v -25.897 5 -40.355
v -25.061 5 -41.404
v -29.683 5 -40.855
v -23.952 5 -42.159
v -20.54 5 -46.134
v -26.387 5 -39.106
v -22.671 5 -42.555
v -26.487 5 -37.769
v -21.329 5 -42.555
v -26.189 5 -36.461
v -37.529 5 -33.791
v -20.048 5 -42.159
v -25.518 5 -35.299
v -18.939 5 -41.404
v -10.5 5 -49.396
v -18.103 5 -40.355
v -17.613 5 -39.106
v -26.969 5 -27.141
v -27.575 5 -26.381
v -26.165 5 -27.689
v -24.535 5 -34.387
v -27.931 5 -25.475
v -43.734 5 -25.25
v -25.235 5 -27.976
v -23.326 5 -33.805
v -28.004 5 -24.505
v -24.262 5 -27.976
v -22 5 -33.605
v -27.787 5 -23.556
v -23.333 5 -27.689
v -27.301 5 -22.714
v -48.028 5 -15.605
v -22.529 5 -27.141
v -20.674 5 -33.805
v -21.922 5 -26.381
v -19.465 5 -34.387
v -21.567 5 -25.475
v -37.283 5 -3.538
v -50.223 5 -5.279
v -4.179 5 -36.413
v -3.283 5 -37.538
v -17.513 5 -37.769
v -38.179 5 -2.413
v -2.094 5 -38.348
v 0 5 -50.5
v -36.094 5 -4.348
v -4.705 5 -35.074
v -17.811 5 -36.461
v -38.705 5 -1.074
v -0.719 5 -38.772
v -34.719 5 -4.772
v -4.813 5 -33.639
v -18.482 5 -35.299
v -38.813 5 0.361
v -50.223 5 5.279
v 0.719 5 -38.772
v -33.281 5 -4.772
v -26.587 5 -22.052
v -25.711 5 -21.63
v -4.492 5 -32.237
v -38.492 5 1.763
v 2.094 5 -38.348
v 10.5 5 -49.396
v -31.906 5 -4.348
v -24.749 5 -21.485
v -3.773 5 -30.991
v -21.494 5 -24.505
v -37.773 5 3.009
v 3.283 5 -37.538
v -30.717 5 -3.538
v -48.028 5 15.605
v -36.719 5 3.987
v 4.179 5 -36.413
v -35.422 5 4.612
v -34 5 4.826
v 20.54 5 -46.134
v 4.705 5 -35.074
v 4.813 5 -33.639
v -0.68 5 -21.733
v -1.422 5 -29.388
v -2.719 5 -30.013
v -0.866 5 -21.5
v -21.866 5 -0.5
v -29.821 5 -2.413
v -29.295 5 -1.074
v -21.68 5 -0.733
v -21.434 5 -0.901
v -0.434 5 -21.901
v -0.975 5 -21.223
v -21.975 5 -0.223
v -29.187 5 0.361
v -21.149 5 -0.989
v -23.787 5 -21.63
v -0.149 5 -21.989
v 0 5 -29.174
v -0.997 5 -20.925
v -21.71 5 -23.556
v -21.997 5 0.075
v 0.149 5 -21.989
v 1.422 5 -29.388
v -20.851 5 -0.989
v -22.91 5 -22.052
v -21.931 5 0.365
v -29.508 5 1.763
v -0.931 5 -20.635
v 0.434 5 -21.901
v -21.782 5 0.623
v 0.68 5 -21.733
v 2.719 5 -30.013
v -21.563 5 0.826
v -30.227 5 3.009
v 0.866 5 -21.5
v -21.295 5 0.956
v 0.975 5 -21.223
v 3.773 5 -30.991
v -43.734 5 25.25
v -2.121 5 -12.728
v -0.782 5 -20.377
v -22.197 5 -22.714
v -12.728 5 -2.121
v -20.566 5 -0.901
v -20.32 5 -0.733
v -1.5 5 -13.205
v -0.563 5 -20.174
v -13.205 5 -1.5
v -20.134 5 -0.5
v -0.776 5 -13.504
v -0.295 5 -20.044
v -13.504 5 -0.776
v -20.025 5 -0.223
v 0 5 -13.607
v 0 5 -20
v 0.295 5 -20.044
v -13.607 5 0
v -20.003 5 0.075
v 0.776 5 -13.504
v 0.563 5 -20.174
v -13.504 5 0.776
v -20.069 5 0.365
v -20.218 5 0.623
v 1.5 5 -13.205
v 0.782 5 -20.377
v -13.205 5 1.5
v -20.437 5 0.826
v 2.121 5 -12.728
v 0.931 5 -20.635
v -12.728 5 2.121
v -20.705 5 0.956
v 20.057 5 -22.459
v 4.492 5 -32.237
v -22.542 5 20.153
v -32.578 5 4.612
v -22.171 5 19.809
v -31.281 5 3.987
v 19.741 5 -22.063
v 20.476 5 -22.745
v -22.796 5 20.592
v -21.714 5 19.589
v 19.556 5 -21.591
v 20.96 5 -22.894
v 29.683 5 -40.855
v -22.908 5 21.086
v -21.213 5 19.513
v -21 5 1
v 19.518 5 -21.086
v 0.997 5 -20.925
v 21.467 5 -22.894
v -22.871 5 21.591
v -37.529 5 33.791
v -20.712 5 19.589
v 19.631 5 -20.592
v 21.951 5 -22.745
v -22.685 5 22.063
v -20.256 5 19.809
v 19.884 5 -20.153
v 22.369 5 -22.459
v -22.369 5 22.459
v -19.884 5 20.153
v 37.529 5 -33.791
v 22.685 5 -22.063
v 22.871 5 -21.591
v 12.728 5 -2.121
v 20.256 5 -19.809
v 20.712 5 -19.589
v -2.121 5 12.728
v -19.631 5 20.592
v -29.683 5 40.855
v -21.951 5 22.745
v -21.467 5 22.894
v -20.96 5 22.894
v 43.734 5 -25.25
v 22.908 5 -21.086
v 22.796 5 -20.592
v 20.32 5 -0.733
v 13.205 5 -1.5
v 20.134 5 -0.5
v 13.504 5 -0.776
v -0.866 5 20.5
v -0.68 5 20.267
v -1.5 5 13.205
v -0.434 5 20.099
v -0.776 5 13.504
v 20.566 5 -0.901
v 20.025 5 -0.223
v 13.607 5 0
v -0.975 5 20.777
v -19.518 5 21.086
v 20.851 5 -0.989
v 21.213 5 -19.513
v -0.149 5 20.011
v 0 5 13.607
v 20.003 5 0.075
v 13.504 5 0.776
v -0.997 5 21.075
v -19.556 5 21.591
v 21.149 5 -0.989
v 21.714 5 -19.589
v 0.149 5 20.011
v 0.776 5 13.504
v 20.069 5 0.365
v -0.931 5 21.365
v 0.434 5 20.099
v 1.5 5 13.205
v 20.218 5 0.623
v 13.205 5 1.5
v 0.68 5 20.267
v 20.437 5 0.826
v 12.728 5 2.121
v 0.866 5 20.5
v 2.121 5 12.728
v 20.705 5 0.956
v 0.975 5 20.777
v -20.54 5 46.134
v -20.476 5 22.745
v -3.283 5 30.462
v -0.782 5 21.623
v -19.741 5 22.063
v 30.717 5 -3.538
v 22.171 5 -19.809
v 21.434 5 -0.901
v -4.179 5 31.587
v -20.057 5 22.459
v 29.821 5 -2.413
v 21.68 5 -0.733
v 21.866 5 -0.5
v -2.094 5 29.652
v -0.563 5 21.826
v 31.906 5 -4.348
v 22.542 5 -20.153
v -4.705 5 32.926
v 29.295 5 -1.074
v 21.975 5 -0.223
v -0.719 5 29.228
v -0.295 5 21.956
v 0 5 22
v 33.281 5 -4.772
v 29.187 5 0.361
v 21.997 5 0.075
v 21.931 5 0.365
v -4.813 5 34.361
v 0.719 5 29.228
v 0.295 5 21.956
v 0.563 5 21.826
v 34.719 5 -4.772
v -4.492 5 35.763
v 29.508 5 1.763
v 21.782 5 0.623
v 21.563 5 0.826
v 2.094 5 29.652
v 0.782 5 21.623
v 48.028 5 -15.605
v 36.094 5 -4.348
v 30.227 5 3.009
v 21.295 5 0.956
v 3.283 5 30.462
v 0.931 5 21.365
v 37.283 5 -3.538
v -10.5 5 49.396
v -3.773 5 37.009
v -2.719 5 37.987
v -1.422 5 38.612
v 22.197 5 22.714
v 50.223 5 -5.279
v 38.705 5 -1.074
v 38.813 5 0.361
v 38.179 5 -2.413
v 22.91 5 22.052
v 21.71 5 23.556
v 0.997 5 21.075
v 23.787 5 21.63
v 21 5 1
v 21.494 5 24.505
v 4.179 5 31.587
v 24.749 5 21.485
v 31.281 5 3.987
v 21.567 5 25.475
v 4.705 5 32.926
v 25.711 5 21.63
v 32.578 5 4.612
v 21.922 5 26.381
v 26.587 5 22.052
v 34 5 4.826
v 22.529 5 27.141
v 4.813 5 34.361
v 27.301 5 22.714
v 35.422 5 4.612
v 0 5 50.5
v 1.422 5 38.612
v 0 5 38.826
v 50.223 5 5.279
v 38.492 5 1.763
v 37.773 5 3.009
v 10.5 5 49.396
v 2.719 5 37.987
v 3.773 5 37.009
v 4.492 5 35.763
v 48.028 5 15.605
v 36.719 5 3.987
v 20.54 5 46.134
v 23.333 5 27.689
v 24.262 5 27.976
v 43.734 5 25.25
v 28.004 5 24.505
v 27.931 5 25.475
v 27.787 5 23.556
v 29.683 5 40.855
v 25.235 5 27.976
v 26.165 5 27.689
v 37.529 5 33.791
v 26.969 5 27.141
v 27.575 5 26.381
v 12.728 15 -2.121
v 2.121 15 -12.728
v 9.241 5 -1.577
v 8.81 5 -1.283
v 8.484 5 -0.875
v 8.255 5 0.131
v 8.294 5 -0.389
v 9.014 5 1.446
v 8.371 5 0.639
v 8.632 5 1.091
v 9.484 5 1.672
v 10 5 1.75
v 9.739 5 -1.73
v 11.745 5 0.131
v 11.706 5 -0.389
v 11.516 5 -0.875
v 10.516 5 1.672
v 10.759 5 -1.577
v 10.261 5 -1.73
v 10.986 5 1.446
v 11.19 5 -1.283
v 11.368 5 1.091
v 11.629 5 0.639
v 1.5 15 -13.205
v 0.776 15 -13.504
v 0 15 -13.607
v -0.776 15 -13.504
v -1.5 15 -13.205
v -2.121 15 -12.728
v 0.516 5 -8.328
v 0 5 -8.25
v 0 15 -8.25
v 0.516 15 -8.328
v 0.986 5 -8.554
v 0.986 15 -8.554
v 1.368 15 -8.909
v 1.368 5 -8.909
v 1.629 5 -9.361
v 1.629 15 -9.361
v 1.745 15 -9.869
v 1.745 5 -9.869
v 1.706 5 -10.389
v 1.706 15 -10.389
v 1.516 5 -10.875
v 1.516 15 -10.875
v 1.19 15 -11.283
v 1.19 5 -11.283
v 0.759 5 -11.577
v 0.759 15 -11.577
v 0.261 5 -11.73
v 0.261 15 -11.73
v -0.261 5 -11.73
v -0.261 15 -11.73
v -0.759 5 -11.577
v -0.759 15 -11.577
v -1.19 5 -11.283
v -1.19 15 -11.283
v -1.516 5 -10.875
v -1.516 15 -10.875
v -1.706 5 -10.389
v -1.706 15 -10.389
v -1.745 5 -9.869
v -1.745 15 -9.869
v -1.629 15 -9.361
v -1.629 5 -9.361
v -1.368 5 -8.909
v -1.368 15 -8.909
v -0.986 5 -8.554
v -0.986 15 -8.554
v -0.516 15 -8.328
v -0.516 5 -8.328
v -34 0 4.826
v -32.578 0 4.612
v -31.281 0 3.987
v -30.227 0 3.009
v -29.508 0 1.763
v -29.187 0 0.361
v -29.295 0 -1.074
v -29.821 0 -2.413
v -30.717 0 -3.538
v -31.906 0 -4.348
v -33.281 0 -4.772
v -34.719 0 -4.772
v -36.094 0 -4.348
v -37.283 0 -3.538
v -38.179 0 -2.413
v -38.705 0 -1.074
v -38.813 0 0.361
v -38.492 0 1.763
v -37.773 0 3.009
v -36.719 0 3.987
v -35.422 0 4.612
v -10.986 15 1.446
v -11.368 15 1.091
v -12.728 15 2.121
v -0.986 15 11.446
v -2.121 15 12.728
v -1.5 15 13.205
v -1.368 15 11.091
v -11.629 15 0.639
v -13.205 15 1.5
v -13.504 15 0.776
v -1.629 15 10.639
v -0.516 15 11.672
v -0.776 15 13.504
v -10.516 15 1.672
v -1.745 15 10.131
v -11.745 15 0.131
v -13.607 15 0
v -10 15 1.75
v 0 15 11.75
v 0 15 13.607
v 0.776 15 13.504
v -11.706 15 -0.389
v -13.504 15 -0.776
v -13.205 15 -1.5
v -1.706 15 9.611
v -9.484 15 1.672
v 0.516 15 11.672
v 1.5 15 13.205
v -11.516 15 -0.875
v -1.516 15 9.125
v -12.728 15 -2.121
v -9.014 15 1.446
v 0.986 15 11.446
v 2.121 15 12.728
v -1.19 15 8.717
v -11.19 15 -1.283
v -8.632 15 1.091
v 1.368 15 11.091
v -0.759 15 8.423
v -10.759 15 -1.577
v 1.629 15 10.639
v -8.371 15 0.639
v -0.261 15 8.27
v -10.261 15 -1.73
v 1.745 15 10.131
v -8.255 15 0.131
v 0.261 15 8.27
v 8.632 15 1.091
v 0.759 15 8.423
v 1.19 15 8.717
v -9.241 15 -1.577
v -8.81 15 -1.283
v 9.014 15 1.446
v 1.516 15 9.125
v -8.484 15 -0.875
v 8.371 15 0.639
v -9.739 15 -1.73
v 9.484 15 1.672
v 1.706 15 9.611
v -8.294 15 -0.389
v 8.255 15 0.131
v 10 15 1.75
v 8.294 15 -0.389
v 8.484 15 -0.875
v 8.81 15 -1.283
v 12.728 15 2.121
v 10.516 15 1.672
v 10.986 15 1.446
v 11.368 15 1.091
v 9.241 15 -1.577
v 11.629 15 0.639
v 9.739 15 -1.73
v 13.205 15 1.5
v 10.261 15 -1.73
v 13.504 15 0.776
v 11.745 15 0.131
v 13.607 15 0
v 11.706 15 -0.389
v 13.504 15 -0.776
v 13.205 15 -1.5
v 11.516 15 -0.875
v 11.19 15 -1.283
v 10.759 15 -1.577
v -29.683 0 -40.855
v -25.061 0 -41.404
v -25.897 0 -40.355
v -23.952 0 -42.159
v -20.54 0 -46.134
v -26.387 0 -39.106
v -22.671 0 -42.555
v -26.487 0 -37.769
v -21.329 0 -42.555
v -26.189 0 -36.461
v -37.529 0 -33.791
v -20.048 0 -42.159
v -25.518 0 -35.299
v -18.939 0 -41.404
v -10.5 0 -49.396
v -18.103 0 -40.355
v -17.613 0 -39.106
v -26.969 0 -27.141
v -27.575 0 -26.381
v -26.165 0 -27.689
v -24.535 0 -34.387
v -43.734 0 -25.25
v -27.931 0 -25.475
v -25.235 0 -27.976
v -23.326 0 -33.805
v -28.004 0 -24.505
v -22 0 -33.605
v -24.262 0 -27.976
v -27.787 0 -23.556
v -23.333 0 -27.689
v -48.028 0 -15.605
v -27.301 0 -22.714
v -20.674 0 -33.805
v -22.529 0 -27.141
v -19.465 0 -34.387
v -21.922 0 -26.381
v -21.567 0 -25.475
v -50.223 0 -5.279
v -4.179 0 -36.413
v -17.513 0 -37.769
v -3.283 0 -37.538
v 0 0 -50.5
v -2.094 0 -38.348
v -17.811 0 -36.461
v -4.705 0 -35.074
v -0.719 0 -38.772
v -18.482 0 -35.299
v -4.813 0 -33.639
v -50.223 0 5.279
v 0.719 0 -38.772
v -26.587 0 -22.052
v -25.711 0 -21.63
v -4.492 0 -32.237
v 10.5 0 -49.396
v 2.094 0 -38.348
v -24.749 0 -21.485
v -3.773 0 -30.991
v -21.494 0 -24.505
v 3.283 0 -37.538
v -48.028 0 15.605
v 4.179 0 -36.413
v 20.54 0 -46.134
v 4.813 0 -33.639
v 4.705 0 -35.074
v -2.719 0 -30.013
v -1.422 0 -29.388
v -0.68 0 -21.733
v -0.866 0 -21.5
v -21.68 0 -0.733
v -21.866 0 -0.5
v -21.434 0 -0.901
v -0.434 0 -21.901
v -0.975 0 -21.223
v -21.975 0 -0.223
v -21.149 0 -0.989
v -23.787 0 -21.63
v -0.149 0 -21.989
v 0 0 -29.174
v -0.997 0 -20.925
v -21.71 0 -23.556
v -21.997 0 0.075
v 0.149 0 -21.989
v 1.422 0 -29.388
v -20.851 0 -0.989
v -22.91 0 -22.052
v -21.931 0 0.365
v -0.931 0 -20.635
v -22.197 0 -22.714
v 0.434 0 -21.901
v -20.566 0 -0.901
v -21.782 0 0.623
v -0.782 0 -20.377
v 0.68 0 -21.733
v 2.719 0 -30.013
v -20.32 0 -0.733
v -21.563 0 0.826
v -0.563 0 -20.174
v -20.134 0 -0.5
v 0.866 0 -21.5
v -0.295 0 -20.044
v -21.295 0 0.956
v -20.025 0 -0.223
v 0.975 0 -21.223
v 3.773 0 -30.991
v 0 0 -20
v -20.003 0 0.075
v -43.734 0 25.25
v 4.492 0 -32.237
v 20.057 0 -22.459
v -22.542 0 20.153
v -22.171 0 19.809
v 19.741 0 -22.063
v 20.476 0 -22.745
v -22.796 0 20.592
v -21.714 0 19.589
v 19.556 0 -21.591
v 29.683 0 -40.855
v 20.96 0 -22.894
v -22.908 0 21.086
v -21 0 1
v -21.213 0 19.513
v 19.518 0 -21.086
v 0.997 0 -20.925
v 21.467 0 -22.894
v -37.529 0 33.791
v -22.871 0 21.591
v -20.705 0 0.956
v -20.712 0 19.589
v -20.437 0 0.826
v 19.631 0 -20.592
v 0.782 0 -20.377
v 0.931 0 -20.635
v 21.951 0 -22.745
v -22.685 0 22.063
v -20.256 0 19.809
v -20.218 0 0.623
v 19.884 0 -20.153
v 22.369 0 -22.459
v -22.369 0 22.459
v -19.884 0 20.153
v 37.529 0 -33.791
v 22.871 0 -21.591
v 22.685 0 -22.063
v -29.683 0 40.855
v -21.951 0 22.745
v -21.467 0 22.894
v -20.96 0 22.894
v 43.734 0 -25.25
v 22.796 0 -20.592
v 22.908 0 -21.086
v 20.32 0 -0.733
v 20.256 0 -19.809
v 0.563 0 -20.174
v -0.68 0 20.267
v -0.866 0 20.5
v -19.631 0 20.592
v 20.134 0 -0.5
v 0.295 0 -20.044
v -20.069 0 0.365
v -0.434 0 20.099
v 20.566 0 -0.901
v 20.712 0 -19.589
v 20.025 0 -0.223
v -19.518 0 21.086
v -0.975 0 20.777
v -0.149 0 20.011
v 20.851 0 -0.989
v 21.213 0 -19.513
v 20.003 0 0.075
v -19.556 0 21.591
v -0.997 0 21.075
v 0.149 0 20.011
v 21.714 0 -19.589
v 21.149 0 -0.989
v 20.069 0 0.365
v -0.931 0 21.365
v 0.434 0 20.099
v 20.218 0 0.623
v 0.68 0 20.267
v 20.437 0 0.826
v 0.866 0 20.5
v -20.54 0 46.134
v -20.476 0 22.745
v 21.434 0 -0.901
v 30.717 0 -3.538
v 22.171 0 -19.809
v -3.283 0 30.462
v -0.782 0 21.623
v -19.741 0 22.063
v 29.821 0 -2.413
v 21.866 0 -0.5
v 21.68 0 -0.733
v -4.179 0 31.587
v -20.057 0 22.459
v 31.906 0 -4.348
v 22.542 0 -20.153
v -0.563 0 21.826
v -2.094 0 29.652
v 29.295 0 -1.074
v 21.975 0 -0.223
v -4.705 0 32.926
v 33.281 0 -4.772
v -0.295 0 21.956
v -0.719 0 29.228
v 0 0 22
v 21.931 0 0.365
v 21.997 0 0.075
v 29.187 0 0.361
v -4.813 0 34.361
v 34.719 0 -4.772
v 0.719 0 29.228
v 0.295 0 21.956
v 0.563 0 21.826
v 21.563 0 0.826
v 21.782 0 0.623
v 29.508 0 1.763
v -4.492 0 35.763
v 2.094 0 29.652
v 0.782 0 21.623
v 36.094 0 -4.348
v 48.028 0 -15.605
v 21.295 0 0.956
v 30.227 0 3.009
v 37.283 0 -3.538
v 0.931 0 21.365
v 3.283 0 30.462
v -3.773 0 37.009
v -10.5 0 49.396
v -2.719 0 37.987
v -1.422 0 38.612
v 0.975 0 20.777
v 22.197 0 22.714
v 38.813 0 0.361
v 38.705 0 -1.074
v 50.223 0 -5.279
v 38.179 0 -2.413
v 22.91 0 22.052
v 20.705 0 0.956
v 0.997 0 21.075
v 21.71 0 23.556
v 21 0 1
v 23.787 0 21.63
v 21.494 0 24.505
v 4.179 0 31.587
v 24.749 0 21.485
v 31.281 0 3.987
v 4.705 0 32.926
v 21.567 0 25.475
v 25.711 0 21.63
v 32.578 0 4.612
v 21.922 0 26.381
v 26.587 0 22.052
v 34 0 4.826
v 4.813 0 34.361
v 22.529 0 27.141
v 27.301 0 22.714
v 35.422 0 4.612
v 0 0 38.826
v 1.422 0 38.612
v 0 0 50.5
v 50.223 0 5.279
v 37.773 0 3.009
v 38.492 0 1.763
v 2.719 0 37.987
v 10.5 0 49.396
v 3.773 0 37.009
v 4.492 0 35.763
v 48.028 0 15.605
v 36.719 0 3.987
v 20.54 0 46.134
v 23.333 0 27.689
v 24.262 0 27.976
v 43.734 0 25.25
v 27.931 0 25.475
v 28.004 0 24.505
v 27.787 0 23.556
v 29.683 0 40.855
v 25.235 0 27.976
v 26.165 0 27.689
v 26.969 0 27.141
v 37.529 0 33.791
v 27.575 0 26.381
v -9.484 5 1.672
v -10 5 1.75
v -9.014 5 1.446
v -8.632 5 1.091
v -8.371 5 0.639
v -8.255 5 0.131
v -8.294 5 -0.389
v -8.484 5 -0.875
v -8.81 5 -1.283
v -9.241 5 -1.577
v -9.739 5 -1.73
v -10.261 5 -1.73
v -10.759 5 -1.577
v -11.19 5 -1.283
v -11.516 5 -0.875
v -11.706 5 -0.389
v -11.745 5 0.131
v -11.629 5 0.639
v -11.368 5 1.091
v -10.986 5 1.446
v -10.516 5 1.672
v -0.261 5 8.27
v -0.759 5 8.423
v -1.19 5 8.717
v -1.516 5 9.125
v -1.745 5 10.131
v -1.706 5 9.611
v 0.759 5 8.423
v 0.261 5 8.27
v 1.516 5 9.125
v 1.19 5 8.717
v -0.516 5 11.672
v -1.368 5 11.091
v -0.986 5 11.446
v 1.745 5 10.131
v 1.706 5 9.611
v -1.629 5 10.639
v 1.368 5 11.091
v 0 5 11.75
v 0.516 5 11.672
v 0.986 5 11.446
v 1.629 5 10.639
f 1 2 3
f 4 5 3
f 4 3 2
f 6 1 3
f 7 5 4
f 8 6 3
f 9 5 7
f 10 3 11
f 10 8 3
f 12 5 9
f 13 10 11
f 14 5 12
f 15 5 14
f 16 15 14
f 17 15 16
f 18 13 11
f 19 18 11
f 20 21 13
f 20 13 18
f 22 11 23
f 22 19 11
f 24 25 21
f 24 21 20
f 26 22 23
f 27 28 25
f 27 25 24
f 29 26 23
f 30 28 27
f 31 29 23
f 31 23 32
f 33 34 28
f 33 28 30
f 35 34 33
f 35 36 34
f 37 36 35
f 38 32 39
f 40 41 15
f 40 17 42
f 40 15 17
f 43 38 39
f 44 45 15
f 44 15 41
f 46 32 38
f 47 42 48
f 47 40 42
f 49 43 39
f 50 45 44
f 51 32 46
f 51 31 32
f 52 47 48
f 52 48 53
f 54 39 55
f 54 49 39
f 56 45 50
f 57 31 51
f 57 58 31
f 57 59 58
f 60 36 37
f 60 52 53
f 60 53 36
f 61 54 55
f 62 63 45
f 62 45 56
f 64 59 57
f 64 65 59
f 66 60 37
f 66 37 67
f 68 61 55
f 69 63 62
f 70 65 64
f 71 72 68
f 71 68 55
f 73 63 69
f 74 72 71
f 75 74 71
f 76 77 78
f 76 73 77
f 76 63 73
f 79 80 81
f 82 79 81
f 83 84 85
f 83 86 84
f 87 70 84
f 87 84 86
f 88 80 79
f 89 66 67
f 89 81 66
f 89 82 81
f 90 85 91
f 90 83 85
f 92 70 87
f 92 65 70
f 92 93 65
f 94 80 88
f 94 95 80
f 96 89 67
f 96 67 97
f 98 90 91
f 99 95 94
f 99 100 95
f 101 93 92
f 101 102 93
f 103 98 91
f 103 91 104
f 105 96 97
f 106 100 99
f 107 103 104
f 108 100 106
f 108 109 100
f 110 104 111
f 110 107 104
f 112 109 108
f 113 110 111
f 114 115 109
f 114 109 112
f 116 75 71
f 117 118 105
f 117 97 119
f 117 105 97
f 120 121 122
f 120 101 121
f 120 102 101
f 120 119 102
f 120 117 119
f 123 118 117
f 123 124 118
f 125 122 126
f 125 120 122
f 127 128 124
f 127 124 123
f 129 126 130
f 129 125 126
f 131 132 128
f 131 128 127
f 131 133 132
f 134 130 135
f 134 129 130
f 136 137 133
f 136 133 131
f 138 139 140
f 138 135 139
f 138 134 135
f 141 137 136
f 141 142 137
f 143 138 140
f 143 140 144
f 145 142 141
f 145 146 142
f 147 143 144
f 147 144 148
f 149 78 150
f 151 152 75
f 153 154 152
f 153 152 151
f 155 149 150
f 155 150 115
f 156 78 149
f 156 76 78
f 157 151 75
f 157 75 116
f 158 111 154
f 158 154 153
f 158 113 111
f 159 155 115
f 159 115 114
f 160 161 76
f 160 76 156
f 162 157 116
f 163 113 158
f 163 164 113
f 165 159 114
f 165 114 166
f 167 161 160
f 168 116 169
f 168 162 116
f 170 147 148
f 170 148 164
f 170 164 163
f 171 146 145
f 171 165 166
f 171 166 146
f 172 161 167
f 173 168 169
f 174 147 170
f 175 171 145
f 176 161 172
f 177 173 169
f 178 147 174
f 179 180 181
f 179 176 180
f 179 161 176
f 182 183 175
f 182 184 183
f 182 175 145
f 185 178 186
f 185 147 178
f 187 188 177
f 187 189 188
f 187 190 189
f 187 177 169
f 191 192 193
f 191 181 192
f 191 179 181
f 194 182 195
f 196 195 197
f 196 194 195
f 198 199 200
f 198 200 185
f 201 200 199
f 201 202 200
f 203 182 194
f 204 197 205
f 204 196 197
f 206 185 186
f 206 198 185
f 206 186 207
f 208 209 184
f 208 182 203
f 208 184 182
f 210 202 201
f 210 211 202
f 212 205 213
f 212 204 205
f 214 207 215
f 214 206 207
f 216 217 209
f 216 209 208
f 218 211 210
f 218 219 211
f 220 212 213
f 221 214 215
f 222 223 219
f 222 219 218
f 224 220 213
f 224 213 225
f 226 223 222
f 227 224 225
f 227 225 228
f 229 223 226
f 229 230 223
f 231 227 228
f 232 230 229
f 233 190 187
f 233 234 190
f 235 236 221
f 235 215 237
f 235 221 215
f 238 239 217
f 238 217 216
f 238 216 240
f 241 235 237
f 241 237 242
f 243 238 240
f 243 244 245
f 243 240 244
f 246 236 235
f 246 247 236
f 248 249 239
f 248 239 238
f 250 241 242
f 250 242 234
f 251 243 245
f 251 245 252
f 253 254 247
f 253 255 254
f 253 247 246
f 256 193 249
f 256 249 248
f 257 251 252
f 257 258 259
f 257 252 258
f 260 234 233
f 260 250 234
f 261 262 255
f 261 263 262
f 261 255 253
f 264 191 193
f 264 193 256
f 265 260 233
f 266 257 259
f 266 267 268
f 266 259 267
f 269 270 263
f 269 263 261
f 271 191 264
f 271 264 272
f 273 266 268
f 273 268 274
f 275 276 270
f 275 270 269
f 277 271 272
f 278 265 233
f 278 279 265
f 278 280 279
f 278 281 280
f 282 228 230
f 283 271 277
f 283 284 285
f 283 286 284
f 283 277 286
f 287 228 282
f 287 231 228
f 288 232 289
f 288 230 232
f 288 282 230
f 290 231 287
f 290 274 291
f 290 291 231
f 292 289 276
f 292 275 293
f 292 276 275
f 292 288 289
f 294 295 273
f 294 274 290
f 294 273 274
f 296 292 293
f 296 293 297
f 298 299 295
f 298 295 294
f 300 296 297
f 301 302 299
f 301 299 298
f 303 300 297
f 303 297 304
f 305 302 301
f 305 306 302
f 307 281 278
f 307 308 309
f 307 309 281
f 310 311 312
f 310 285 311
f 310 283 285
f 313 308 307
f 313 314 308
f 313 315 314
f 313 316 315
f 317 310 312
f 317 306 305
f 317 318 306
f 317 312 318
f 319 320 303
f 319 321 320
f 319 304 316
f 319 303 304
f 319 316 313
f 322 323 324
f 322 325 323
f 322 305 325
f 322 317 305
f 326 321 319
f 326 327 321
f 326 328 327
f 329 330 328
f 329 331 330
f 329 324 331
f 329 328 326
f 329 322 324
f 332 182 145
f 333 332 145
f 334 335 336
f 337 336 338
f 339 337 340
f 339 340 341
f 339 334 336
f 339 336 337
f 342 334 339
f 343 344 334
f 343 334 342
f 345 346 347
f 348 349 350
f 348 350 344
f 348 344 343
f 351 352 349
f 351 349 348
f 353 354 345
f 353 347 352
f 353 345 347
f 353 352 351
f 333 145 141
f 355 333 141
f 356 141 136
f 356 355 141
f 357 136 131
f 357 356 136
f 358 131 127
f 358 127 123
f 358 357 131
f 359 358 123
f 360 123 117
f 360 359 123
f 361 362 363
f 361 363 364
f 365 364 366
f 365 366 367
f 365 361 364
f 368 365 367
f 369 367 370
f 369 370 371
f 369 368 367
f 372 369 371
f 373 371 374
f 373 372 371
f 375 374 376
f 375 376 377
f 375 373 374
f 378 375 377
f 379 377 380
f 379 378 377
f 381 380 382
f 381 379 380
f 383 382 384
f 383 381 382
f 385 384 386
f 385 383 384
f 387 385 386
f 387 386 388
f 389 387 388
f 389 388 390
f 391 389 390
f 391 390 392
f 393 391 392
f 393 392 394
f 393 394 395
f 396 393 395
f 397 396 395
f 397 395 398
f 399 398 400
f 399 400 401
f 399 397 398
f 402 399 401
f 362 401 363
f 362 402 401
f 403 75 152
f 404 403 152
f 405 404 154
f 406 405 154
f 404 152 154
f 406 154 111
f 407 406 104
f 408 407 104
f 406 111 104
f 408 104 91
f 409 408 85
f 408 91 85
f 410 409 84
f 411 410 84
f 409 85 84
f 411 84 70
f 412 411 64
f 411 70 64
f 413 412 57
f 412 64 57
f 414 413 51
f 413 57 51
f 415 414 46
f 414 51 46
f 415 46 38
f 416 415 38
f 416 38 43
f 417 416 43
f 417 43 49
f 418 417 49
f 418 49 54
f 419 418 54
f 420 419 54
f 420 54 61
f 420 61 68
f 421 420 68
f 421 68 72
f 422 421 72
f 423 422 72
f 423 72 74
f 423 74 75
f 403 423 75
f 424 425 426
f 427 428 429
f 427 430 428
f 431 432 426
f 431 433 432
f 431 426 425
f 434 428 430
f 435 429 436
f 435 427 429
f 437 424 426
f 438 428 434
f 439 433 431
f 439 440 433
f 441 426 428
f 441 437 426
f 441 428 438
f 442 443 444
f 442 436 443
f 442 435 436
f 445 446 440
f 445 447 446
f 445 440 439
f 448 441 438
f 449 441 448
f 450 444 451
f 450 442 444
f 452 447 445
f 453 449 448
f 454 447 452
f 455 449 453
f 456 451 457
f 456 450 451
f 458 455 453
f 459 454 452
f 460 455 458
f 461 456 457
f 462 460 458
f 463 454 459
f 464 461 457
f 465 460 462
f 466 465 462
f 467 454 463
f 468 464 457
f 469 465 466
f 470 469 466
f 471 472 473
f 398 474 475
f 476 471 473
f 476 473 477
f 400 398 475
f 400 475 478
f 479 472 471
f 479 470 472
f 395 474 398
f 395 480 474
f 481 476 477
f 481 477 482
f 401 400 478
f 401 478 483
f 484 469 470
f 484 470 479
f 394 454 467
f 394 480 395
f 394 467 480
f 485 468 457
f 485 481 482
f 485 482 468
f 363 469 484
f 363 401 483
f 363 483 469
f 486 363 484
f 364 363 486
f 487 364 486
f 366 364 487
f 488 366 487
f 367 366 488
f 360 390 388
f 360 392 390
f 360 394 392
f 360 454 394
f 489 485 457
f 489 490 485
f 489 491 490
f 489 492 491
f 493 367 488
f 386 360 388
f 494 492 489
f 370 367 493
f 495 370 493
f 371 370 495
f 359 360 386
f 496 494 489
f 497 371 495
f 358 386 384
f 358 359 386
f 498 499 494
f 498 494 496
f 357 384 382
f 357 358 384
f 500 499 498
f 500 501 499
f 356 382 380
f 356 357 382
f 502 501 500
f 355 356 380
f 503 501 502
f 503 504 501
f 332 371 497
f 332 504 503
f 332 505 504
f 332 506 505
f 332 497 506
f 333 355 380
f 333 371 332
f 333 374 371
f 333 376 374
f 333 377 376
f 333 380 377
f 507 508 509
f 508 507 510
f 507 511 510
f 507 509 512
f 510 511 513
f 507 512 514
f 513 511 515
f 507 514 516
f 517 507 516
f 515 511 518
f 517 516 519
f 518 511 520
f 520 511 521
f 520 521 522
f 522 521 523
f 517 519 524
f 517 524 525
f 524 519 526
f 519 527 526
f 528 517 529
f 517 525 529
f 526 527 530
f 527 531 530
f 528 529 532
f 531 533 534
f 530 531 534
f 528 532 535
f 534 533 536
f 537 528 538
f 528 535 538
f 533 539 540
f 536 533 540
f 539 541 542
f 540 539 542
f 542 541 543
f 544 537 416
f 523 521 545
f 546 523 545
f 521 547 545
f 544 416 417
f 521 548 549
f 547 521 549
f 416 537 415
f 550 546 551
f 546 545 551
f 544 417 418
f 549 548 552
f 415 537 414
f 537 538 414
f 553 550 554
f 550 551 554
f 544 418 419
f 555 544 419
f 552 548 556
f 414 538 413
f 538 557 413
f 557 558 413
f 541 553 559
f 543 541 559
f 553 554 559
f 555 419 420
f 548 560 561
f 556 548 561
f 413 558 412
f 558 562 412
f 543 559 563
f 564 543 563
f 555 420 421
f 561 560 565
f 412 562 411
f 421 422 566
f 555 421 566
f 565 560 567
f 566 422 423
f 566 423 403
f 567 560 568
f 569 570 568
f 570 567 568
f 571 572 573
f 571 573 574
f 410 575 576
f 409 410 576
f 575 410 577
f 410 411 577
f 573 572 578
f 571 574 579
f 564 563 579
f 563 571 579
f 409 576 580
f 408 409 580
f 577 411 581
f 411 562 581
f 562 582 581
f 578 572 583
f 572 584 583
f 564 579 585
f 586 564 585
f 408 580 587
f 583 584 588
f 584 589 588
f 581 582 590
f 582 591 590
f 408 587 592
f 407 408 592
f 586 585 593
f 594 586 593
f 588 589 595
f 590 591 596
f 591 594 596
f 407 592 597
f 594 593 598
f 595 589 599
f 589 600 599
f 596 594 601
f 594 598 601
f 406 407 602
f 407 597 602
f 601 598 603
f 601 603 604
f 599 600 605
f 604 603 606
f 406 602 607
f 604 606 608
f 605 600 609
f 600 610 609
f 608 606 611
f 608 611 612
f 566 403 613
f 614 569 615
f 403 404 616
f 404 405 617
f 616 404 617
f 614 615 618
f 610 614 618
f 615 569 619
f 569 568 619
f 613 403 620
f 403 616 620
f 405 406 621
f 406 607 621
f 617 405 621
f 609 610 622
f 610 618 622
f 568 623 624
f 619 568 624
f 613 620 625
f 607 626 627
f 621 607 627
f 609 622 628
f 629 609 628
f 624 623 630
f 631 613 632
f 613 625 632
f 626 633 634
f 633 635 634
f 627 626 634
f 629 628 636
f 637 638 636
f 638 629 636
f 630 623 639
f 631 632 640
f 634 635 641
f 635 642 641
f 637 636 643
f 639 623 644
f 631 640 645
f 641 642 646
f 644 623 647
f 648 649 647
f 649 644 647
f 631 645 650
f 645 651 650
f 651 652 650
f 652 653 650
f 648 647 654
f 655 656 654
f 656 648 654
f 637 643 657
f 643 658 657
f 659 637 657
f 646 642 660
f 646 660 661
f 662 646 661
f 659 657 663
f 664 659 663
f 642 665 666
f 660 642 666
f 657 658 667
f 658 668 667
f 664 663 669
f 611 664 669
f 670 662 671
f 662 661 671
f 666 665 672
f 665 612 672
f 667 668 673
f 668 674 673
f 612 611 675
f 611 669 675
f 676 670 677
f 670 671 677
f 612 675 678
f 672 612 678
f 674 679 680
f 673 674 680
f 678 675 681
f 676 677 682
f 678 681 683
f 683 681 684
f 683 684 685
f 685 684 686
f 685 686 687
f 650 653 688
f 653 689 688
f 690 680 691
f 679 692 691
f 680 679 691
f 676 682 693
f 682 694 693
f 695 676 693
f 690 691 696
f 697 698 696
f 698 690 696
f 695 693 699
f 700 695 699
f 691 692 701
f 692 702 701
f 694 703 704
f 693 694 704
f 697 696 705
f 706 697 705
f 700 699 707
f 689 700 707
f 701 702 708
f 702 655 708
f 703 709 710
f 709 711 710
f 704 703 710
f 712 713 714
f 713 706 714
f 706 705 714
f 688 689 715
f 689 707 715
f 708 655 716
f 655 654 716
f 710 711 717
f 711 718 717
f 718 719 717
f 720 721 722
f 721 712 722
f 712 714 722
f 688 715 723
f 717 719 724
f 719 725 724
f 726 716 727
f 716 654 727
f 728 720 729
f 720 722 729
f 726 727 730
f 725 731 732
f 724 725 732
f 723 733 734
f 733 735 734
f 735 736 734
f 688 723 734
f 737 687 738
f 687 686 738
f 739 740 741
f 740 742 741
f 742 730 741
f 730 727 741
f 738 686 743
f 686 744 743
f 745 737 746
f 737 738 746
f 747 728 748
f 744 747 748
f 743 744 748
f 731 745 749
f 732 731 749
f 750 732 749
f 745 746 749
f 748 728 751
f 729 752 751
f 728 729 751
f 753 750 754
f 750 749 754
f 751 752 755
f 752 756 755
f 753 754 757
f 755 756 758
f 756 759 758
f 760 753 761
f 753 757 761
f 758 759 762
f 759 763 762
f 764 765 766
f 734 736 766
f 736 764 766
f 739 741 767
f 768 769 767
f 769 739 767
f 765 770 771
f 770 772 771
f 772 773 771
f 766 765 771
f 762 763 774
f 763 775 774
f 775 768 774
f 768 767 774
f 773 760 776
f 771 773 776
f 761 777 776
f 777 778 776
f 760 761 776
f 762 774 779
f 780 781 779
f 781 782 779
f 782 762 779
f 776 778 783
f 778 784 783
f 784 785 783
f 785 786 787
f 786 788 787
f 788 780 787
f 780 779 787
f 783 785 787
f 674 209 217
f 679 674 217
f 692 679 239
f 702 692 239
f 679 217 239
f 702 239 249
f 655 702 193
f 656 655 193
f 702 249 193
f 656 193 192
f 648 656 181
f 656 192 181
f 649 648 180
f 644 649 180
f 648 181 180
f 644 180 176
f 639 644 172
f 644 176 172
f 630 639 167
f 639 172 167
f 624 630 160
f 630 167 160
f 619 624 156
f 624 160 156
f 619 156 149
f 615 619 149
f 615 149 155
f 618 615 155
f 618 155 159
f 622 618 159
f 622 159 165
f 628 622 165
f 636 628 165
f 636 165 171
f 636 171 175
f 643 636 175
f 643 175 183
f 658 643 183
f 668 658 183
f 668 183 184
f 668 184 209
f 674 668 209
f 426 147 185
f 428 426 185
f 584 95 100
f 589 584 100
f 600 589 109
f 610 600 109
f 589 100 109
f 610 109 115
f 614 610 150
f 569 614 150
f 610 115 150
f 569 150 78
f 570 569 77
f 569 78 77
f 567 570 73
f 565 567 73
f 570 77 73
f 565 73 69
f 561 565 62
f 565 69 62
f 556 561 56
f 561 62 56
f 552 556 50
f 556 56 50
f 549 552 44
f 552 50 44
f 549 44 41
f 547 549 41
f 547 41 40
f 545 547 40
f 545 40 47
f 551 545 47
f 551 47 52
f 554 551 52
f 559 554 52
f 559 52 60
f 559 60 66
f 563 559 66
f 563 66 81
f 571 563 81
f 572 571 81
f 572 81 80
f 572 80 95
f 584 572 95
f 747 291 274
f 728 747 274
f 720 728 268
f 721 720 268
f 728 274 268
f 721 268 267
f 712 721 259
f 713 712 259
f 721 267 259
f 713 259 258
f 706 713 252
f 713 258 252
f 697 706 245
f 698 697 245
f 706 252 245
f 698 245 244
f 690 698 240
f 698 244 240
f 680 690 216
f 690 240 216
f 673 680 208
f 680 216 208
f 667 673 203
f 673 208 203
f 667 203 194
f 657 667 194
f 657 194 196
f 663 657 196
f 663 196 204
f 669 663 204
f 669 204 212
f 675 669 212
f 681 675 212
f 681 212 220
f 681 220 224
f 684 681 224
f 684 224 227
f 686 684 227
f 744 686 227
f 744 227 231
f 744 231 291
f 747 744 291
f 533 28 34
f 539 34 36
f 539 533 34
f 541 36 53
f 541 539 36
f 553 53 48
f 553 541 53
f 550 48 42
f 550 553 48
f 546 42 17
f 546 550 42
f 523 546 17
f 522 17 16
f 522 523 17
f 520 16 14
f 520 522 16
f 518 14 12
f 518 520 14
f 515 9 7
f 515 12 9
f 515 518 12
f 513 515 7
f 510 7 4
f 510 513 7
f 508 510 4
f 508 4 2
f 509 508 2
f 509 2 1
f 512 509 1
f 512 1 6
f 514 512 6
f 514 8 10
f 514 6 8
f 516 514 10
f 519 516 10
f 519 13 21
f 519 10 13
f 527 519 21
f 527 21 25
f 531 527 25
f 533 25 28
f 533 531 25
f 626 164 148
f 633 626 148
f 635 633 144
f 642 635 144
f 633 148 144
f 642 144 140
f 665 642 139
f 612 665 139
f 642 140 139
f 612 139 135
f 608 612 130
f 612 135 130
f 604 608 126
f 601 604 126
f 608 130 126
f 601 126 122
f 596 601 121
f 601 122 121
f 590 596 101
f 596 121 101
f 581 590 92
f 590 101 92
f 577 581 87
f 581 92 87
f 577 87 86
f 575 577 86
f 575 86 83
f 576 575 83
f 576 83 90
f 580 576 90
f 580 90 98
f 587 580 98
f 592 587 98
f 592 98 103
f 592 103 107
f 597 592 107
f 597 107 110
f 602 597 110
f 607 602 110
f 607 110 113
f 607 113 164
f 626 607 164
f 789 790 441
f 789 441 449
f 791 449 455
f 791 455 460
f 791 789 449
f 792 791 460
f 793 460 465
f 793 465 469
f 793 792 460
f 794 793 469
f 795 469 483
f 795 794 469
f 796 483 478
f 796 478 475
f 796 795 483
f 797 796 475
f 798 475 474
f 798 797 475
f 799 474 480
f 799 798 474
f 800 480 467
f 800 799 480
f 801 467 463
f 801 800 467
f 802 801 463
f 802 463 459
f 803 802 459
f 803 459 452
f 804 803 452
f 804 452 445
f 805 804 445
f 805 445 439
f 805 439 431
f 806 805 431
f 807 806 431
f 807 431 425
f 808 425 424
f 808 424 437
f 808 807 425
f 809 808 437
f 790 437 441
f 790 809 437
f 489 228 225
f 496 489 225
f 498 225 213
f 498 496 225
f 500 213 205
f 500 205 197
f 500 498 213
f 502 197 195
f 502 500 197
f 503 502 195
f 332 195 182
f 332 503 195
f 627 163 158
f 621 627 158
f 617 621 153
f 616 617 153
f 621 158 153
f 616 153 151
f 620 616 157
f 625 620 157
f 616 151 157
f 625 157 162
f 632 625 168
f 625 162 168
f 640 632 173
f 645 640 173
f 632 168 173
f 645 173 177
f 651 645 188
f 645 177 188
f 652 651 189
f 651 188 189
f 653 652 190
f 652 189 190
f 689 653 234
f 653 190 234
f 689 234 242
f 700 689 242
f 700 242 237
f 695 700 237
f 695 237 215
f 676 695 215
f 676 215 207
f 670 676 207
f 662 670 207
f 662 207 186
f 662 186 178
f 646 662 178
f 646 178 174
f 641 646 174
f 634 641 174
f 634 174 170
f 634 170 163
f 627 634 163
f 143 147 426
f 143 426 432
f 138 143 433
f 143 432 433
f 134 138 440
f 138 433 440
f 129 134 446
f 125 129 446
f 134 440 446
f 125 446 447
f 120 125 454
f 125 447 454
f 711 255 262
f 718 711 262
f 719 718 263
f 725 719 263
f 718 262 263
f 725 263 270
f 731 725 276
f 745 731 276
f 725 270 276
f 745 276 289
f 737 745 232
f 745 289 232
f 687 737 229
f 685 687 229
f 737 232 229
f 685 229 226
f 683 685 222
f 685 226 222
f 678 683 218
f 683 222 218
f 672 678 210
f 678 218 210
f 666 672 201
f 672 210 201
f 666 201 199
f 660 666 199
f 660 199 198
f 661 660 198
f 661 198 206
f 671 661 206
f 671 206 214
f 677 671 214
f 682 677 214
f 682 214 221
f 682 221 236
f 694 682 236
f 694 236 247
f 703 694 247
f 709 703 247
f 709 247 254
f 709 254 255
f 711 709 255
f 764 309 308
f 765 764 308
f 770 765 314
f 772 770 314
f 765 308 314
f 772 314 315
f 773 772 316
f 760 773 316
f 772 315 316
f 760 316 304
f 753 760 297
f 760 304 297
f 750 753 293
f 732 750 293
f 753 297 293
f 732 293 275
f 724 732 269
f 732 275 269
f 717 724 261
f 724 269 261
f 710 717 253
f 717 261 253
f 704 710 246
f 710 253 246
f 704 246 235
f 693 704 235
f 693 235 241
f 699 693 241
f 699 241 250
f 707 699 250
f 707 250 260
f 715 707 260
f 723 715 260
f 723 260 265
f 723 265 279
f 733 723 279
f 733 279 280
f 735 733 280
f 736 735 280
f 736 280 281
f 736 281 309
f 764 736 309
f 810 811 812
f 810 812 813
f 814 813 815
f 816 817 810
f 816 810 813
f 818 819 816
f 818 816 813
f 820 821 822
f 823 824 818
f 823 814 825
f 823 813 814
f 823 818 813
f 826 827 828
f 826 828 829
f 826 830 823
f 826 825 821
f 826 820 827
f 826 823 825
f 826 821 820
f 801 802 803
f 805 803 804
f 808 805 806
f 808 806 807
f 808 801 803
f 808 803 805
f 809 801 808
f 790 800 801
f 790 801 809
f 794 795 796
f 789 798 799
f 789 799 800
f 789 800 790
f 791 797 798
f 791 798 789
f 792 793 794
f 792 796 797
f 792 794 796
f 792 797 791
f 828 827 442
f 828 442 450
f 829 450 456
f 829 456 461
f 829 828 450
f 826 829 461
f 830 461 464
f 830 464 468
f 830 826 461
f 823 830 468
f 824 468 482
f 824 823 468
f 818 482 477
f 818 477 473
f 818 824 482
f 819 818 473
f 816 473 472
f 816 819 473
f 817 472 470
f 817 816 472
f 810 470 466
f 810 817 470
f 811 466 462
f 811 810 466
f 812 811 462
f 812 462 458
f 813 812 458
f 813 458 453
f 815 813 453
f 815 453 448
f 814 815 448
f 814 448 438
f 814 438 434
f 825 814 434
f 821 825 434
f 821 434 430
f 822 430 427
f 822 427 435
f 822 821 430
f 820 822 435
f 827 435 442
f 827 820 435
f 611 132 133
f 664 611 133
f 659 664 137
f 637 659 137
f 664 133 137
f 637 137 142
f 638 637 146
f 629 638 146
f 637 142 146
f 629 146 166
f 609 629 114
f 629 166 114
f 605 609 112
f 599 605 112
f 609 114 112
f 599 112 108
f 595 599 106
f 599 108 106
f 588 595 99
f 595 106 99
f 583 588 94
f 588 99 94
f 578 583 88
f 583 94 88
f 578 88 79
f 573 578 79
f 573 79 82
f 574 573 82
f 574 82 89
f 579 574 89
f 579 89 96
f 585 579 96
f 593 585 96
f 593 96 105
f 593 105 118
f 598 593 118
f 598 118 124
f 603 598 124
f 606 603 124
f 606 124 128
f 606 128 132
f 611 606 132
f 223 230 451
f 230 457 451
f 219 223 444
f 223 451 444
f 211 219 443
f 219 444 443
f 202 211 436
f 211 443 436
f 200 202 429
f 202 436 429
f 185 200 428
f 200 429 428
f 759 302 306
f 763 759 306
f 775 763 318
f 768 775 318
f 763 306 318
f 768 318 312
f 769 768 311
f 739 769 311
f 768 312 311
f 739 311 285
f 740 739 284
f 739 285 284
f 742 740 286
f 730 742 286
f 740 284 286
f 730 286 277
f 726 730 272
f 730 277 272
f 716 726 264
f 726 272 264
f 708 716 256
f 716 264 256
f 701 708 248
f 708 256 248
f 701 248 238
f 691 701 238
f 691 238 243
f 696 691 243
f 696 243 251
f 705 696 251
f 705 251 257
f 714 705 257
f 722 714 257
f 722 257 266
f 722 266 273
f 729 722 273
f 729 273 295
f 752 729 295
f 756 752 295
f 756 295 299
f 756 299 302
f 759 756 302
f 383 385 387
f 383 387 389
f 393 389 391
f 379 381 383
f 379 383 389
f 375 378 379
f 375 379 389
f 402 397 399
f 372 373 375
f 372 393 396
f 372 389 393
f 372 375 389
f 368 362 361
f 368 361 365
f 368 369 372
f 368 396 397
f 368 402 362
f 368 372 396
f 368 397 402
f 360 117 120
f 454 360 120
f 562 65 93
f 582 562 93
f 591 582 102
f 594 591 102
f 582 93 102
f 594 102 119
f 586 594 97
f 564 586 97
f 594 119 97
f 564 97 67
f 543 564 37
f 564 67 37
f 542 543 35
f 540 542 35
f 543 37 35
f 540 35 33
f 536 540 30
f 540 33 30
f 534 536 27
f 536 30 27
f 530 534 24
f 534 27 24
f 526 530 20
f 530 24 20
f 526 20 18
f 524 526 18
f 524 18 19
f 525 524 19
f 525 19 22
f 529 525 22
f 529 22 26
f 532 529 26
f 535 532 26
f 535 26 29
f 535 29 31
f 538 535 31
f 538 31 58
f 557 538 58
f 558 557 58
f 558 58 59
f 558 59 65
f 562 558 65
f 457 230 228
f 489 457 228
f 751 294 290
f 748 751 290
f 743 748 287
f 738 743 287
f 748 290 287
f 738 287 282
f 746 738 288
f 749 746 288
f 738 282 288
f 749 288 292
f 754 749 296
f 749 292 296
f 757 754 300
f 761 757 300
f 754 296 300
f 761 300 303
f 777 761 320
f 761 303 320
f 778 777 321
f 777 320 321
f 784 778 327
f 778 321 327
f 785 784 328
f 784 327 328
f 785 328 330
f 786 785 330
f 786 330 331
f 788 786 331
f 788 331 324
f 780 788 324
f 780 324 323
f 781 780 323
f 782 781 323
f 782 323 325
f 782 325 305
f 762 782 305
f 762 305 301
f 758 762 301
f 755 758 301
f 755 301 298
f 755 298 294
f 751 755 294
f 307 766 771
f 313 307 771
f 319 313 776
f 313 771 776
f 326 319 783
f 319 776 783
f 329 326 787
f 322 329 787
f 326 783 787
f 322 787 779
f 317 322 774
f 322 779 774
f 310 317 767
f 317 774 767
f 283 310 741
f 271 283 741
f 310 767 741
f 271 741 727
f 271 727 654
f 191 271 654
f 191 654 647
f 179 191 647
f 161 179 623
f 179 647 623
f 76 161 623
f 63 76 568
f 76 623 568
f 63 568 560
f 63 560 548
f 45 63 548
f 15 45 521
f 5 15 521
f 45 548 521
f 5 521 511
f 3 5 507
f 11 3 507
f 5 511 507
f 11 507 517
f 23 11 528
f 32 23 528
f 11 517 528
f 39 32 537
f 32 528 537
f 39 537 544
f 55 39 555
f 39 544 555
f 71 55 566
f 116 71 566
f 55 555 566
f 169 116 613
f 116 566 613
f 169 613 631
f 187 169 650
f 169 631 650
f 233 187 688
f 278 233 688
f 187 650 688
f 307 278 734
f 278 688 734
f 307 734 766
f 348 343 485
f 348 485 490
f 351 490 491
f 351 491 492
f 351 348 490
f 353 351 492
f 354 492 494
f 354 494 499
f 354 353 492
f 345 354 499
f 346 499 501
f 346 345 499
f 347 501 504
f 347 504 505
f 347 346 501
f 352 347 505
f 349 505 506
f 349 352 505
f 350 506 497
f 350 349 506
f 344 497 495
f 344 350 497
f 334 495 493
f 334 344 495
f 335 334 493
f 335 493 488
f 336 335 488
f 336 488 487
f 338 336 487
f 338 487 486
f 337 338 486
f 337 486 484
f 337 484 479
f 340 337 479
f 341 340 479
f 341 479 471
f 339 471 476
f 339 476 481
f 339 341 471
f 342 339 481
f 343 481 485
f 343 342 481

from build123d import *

# Parameters (mm, degrees)
SKETCH1_R           = 50.5
BOSS_EXTRUDE1_DEPTH = 5
SKETCH3_R           = 1.75
BOSS_EXTRUDE2_DEPTH = 10
SKETCH4_R           = 1.7
SKETCH4_R_2         = 3.2639
CUT_EXTRUDE2_DEPTH  = 73.114492302
SKETCH5_R           = 4.826
CUT_EXTRUDE3_DEPTH  = 73.114492302
SKETCH6_R           = 1
CUT_EXTRUDE4_DEPTH  = 10
FILLET1_R           = 3
SKETCH7_R           = 4.5
CUT_EXTRUDE5_DEPTH  = 73.97602346


with BuildPart() as part:
    # Sketch1 → Boss-Extrude1 (new body)
    with BuildSketch(Plane(origin=(0, 0, 0), x_dir=(1, 0, 0), z_dir=(0, 1, 0))):
        with Locations(Location((0, 0, 0), (0, 0, 270))):
            Circle(SKETCH1_R)
    extrude(amount=BOSS_EXTRUDE1_DEPTH)

    # Sketch3 → Boss-Extrude2 (add)
    with BuildSketch(Plane(origin=(0, 5, 0), x_dir=(1, 0, 0), z_dir=(0, 1, 0))):
        Polygon((0, -14.849242405), (14.849242405, 0), (0, 14.849242405), (-14.849242405, 0), align=None)
        with Locations(Location((10, 0, 0), (0, 0, 270))):
            Circle(SKETCH3_R, mode=Mode.SUBTRACT)
        with Locations(Location((0, -10, 0), (0, 0, 270))):
            Circle(SKETCH3_R, mode=Mode.SUBTRACT)
        with Locations(Location((-10, 0, 0), (0, 0, 270))):
            Circle(SKETCH3_R, mode=Mode.SUBTRACT)
        with Locations(Location((0, 10, 0), (0, 0, 270))):
            Circle(SKETCH3_R, mode=Mode.SUBTRACT)
    extrude(amount=BOSS_EXTRUDE2_DEPTH)

    # Sketch4 → Cut-Extrude2 (cut, through all)
    with BuildSketch(Plane(origin=(0, 5, 0), x_dir=(1, 0, 0), z_dir=(0, 1, 0))):
        with Locations(Location((21.213203436, 21.213203436, 0), (0, 0, 270))):
            Circle(SKETCH4_R)
        with Locations(Location((-21.213203436, -21.213203436, 0), (0, 0, 90))):
            Circle(SKETCH4_R)
        with Locations(Location((-24.748737342, 24.748737342, 0), (0, 0, 270))):
            Circle(SKETCH4_R_2)
        with Locations(Location((24.748737342, -24.748737342, 0), (0, 0, 90))):
            Circle(SKETCH4_R_2)
    extrude(amount=-CUT_EXTRUDE2_DEPTH, mode=Mode.SUBTRACT)

    # Sketch5 → Cut-Extrude3 (cut, through all)
    with BuildSketch(Plane(origin=(0, 5, 0), x_dir=(1, 0, 0), z_dir=(0, 1, 0))):
        with Locations(Location((34, 0, 0), (0, 0, 270))):
            Circle(SKETCH5_R)
        with Locations(Location((0, 34, 0), (0, 0, 270))):
            Circle(SKETCH5_R)
        with Locations(Location((-34, 0, 0), (0, 0, 270))):
            Circle(SKETCH5_R)
        with Locations(Location((0, -34, 0), (0, 0, 270))):
            Circle(SKETCH5_R)
    extrude(amount=-CUT_EXTRUDE3_DEPTH, mode=Mode.SUBTRACT)

    # Sketch6 → Cut-Extrude4 (cut)
    with BuildSketch(Plane(origin=(0, 5, 0), x_dir=(1, 0, 0), z_dir=(0, 1, 0))):
        with Locations(Location((0, 21, 0), (0, 0, 270))):
            Circle(SKETCH6_R)
        with Locations(Location((-21, 0, 0), (0, 0, 270))):
            Circle(SKETCH6_R)
        with Locations(Location((21, 0, 0), (0, 0, 270))):
            Circle(SKETCH6_R)
        with Locations(Location((0, -21, 0), (0, 0, 270))):
            Circle(SKETCH6_R)
    extrude(amount=-CUT_EXTRUDE4_DEPTH, mode=Mode.SUBTRACT)

    # Fillet1
    fillet1_edges = [part.edges().sort_by_distance(p)[0] for p in [
        (-14.849242405, 10, 0),
        (0, 10, 14.849242405),
        (14.849242405, 10, 0),
        (0, 10, -14.849242405),
    ]]
    fillet(fillet1_edges, radius=FILLET1_R)

    # Sketch7 → Cut-Extrude5 (cut, through all)
    with BuildSketch(Plane(origin=(0, 0, 0), x_dir=(1, 0, 0), z_dir=(0, 1, 0))):
        with Locations(Location((-22, 38.105117767, 0), (0, 0, 270))):
            Circle(SKETCH7_R)
    extrude(amount=CUT_EXTRUDE5_DEPTH, mode=Mode.SUBTRACT)


solid = part.part
